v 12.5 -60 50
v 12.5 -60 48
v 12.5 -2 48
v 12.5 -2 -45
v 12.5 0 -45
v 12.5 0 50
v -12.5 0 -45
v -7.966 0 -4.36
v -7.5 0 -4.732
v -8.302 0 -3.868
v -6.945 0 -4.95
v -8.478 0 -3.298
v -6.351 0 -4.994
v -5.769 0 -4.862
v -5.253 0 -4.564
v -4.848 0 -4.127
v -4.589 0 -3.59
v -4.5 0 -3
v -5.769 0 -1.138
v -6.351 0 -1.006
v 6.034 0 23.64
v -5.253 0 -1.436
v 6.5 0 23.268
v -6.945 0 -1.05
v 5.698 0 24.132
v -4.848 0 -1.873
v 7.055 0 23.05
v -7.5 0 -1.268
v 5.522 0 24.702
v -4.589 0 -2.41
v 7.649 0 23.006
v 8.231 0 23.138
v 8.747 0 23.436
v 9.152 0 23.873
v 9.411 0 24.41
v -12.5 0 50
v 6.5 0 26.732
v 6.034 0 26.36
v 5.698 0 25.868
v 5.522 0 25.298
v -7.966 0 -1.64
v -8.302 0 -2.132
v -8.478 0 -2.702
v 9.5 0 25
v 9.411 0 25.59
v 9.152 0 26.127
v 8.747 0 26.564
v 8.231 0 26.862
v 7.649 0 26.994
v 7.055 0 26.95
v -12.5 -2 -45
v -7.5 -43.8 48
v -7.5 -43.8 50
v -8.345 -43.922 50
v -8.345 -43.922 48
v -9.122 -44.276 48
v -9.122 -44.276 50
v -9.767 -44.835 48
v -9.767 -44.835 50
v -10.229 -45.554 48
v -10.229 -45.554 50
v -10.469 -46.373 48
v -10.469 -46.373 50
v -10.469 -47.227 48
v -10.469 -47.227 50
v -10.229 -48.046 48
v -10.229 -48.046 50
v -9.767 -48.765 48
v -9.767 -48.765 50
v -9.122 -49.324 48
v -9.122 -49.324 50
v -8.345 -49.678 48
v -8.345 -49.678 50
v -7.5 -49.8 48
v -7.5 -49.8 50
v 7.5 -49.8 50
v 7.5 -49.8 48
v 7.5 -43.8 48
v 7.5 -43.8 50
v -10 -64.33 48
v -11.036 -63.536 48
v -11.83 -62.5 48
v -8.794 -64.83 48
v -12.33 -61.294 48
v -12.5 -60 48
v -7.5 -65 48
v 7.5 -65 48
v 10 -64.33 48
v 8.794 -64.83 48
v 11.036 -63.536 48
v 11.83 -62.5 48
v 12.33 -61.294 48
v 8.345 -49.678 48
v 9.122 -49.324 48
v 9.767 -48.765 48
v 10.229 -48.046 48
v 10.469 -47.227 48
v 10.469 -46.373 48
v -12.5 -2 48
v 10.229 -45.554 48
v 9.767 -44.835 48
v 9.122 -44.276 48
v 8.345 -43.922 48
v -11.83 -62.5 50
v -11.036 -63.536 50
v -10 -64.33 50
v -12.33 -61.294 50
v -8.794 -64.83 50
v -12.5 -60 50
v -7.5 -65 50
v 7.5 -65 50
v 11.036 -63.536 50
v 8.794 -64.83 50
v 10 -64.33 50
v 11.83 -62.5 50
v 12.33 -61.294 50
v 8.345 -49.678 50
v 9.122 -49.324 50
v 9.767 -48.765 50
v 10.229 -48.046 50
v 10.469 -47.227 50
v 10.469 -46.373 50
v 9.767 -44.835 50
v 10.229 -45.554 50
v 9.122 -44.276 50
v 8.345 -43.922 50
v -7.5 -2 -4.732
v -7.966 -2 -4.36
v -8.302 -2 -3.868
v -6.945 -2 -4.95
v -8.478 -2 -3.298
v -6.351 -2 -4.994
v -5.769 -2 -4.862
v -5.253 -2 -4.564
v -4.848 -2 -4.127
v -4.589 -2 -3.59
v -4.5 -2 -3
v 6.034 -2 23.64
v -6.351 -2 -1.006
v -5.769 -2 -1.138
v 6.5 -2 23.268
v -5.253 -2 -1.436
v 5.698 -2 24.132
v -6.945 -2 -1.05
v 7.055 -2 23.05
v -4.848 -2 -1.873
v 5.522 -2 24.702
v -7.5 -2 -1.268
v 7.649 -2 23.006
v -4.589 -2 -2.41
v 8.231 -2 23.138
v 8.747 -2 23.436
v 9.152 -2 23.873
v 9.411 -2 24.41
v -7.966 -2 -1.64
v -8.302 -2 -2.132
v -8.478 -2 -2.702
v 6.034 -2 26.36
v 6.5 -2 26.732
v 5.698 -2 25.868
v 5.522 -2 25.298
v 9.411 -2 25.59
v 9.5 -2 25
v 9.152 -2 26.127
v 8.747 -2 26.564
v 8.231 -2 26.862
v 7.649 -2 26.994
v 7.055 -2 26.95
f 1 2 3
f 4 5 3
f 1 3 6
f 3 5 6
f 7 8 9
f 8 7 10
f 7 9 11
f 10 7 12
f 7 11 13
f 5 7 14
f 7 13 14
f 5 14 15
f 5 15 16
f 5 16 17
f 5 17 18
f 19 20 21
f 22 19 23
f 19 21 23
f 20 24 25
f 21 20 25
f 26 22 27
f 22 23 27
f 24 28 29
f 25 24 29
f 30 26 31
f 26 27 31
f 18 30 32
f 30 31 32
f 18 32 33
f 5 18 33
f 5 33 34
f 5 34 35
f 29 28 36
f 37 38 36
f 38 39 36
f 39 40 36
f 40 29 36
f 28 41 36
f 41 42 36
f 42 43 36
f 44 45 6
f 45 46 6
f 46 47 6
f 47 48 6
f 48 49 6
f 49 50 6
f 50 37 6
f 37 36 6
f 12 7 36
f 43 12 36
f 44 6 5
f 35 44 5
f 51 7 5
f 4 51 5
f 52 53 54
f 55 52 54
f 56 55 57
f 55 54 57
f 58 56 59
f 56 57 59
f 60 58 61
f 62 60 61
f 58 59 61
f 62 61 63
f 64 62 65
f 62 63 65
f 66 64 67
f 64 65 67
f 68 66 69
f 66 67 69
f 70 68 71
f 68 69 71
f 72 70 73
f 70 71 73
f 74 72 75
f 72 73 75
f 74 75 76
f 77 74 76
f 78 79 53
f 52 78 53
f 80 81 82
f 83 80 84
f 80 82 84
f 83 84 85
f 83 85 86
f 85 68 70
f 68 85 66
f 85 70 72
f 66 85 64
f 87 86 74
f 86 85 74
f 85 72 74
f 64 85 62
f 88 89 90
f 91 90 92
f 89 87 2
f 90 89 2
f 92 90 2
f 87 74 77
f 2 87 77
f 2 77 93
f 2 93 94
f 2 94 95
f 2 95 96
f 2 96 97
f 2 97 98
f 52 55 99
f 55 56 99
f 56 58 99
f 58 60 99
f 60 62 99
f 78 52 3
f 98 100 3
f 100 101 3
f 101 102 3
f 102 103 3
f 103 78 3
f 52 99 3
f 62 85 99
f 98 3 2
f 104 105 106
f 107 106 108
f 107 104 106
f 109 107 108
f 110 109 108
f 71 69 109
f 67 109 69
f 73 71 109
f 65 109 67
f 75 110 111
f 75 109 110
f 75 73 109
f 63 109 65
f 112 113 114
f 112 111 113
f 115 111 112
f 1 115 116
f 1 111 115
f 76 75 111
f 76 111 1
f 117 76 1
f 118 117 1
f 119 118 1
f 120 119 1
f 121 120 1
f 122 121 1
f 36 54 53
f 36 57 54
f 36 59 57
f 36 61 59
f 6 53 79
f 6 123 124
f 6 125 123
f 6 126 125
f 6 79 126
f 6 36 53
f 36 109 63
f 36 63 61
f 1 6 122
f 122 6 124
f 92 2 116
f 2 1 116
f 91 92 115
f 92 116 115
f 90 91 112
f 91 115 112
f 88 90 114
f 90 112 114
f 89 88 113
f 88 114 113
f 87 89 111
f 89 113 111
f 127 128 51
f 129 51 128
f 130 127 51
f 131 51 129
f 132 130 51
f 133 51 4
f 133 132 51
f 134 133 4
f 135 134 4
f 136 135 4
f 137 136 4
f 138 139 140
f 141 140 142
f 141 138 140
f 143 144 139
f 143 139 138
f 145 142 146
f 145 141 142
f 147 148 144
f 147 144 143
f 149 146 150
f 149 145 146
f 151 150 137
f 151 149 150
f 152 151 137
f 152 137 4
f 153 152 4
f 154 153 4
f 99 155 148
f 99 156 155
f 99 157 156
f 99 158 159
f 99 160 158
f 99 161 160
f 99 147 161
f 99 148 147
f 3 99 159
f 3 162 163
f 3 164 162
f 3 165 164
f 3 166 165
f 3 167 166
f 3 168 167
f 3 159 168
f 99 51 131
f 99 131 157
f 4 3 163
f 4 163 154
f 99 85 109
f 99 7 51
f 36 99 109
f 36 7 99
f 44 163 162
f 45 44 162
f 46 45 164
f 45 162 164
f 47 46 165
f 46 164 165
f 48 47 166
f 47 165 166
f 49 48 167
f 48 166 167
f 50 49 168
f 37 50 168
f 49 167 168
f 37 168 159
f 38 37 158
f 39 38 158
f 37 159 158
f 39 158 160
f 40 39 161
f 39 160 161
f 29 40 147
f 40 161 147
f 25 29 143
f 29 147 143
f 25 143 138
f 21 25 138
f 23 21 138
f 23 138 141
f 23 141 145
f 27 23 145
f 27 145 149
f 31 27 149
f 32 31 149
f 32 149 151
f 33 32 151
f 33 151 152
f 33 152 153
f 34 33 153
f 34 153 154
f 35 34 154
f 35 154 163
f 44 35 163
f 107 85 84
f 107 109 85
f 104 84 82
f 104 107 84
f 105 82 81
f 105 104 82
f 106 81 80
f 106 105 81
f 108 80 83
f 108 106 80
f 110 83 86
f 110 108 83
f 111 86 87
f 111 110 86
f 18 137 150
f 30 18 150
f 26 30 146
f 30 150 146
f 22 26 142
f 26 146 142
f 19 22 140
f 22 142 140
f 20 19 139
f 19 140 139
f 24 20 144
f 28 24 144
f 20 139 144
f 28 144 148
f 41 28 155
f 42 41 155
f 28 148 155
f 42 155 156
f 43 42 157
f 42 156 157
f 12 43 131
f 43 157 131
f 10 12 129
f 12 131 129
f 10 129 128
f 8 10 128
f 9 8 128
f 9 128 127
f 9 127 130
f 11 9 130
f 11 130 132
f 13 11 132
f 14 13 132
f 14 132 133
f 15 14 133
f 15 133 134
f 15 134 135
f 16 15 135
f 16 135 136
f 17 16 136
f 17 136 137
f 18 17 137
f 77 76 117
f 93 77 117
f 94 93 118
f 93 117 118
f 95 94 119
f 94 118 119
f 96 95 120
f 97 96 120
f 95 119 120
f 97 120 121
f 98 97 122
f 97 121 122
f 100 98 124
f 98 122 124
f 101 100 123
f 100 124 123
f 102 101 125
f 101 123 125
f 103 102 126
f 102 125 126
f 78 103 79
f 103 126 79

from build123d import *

# Parameters (mm, degrees)
F0_W      = 25
F0_H      = 90
F1_DEPTH  = 2
F2_R      = 2
F3_DEPTH  = 25
F4_W      = 25
F4_H      = 5
F5_DEPTH  = 2
F6_W      = 25
F6_H      = 2
F7_DEPTH  = 63
F8_R      = 5
F10_DEPTH = 25


with BuildPart() as f1:
    # F0 (on Front) → F1 (new body)
    with BuildSketch(Plane.XZ):
        Rectangle(F0_W, F0_H)
    extrude(amount=F1_DEPTH)

    # F2 (on face) → F3 (cut)
    with BuildSketch(Plane.XZ.offset(2)):
        with Locations((7.5, 25)):
            Circle(F2_R)
        with Locations((-6.5, -3)):
            Circle(F2_R)
    extrude(amount=-F3_DEPTH, mode=Mode.SUBTRACT)

    # F4 (on face) → F5 (join)
    with BuildSketch(Plane.XZ.offset(2)):
        with Locations((0, 47.5)):
            Rectangle(F4_W, F4_H)
    extrude(amount=-F5_DEPTH)

    # F6 (on face) → F7 (join)
    with BuildSketch(Plane.XZ.offset(2)):
        with Locations((0, 49)):
            Rectangle(F6_W, F6_H)
    extrude(amount=F7_DEPTH)

    # F8
    f8_edges = [f1.edges().sort_by_distance(p)[0] for p in [
        (-12.5, -65, 49),
        (12.5, -65, 49),
    ]]
    fillet(f8_edges, radius=F8_R)

    # F9 (on face) → F10 (cut)
    with BuildSketch(Plane.XY.offset(50)):
        with BuildLine():
            Line((-7.5, -49.8), (7.5, -49.8))
            ThreePointArc((7.5, -49.8), (10.5, -46.8), (7.5, -43.8))
            Line((7.5, -43.8), (-7.5, -43.8))
            ThreePointArc((-7.5, -43.8), (-10.5, -46.8), (-7.5, -49.8))
        make_face()
    extrude(amount=-F10_DEPTH, mode=Mode.SUBTRACT)


solid = f1.part
